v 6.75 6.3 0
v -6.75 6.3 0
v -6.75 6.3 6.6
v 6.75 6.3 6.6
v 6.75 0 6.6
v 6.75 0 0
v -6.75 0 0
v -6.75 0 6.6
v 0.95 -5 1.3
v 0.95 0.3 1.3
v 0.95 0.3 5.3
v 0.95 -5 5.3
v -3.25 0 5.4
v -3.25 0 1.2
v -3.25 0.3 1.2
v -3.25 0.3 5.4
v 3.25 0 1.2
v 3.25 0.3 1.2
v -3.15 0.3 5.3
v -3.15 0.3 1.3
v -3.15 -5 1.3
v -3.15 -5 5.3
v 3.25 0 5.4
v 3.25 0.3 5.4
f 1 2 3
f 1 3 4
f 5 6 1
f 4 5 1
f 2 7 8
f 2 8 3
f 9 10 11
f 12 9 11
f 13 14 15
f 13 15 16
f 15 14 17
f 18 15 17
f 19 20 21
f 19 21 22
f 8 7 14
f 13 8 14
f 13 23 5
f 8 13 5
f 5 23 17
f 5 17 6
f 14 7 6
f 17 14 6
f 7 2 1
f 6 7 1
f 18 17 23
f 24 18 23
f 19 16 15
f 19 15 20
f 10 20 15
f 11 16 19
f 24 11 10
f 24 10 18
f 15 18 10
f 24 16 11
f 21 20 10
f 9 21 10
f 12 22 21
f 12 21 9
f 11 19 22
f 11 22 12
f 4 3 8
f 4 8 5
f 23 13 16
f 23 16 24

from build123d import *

# Parameters (mm, degrees)
SKETCH_W     = 13.5
SKETCH_H     = 6.3
PAD_DEPTH    = 6.6
SKETCH001_W  = 6.5
SKETCH001_H  = 4.2
POCKET_DEPTH = 0.3
SKETCH002_W  = 4.1
SKETCH002_H  = 4
PAD001_DEPTH = 5.3


with BuildPart() as part:
    # Sketch → Pad (new body)
    with BuildSketch(Plane.XY):
        with Locations((0, 3.15)):
            Rectangle(SKETCH_W, SKETCH_H)
    extrude(amount=PAD_DEPTH)

    # Sketch001 (on Face3 of Pad) → Pocket (cut)
    with BuildSketch(Plane.XZ):
        with Locations((0, 3.3)):
            Rectangle(SKETCH001_W, SKETCH001_H)
    extrude(amount=-POCKET_DEPTH, mode=Mode.SUBTRACT)

    # Sketch002 (on Face11 of Pocket) → Pad001 (join)
    with BuildSketch(Plane.XZ.offset(-0.3)):
        with Locations((-1.1, 3.3)):
            Rectangle(SKETCH002_W, SKETCH002_H)
    extrude(amount=PAD001_DEPTH)


solid = part.part
